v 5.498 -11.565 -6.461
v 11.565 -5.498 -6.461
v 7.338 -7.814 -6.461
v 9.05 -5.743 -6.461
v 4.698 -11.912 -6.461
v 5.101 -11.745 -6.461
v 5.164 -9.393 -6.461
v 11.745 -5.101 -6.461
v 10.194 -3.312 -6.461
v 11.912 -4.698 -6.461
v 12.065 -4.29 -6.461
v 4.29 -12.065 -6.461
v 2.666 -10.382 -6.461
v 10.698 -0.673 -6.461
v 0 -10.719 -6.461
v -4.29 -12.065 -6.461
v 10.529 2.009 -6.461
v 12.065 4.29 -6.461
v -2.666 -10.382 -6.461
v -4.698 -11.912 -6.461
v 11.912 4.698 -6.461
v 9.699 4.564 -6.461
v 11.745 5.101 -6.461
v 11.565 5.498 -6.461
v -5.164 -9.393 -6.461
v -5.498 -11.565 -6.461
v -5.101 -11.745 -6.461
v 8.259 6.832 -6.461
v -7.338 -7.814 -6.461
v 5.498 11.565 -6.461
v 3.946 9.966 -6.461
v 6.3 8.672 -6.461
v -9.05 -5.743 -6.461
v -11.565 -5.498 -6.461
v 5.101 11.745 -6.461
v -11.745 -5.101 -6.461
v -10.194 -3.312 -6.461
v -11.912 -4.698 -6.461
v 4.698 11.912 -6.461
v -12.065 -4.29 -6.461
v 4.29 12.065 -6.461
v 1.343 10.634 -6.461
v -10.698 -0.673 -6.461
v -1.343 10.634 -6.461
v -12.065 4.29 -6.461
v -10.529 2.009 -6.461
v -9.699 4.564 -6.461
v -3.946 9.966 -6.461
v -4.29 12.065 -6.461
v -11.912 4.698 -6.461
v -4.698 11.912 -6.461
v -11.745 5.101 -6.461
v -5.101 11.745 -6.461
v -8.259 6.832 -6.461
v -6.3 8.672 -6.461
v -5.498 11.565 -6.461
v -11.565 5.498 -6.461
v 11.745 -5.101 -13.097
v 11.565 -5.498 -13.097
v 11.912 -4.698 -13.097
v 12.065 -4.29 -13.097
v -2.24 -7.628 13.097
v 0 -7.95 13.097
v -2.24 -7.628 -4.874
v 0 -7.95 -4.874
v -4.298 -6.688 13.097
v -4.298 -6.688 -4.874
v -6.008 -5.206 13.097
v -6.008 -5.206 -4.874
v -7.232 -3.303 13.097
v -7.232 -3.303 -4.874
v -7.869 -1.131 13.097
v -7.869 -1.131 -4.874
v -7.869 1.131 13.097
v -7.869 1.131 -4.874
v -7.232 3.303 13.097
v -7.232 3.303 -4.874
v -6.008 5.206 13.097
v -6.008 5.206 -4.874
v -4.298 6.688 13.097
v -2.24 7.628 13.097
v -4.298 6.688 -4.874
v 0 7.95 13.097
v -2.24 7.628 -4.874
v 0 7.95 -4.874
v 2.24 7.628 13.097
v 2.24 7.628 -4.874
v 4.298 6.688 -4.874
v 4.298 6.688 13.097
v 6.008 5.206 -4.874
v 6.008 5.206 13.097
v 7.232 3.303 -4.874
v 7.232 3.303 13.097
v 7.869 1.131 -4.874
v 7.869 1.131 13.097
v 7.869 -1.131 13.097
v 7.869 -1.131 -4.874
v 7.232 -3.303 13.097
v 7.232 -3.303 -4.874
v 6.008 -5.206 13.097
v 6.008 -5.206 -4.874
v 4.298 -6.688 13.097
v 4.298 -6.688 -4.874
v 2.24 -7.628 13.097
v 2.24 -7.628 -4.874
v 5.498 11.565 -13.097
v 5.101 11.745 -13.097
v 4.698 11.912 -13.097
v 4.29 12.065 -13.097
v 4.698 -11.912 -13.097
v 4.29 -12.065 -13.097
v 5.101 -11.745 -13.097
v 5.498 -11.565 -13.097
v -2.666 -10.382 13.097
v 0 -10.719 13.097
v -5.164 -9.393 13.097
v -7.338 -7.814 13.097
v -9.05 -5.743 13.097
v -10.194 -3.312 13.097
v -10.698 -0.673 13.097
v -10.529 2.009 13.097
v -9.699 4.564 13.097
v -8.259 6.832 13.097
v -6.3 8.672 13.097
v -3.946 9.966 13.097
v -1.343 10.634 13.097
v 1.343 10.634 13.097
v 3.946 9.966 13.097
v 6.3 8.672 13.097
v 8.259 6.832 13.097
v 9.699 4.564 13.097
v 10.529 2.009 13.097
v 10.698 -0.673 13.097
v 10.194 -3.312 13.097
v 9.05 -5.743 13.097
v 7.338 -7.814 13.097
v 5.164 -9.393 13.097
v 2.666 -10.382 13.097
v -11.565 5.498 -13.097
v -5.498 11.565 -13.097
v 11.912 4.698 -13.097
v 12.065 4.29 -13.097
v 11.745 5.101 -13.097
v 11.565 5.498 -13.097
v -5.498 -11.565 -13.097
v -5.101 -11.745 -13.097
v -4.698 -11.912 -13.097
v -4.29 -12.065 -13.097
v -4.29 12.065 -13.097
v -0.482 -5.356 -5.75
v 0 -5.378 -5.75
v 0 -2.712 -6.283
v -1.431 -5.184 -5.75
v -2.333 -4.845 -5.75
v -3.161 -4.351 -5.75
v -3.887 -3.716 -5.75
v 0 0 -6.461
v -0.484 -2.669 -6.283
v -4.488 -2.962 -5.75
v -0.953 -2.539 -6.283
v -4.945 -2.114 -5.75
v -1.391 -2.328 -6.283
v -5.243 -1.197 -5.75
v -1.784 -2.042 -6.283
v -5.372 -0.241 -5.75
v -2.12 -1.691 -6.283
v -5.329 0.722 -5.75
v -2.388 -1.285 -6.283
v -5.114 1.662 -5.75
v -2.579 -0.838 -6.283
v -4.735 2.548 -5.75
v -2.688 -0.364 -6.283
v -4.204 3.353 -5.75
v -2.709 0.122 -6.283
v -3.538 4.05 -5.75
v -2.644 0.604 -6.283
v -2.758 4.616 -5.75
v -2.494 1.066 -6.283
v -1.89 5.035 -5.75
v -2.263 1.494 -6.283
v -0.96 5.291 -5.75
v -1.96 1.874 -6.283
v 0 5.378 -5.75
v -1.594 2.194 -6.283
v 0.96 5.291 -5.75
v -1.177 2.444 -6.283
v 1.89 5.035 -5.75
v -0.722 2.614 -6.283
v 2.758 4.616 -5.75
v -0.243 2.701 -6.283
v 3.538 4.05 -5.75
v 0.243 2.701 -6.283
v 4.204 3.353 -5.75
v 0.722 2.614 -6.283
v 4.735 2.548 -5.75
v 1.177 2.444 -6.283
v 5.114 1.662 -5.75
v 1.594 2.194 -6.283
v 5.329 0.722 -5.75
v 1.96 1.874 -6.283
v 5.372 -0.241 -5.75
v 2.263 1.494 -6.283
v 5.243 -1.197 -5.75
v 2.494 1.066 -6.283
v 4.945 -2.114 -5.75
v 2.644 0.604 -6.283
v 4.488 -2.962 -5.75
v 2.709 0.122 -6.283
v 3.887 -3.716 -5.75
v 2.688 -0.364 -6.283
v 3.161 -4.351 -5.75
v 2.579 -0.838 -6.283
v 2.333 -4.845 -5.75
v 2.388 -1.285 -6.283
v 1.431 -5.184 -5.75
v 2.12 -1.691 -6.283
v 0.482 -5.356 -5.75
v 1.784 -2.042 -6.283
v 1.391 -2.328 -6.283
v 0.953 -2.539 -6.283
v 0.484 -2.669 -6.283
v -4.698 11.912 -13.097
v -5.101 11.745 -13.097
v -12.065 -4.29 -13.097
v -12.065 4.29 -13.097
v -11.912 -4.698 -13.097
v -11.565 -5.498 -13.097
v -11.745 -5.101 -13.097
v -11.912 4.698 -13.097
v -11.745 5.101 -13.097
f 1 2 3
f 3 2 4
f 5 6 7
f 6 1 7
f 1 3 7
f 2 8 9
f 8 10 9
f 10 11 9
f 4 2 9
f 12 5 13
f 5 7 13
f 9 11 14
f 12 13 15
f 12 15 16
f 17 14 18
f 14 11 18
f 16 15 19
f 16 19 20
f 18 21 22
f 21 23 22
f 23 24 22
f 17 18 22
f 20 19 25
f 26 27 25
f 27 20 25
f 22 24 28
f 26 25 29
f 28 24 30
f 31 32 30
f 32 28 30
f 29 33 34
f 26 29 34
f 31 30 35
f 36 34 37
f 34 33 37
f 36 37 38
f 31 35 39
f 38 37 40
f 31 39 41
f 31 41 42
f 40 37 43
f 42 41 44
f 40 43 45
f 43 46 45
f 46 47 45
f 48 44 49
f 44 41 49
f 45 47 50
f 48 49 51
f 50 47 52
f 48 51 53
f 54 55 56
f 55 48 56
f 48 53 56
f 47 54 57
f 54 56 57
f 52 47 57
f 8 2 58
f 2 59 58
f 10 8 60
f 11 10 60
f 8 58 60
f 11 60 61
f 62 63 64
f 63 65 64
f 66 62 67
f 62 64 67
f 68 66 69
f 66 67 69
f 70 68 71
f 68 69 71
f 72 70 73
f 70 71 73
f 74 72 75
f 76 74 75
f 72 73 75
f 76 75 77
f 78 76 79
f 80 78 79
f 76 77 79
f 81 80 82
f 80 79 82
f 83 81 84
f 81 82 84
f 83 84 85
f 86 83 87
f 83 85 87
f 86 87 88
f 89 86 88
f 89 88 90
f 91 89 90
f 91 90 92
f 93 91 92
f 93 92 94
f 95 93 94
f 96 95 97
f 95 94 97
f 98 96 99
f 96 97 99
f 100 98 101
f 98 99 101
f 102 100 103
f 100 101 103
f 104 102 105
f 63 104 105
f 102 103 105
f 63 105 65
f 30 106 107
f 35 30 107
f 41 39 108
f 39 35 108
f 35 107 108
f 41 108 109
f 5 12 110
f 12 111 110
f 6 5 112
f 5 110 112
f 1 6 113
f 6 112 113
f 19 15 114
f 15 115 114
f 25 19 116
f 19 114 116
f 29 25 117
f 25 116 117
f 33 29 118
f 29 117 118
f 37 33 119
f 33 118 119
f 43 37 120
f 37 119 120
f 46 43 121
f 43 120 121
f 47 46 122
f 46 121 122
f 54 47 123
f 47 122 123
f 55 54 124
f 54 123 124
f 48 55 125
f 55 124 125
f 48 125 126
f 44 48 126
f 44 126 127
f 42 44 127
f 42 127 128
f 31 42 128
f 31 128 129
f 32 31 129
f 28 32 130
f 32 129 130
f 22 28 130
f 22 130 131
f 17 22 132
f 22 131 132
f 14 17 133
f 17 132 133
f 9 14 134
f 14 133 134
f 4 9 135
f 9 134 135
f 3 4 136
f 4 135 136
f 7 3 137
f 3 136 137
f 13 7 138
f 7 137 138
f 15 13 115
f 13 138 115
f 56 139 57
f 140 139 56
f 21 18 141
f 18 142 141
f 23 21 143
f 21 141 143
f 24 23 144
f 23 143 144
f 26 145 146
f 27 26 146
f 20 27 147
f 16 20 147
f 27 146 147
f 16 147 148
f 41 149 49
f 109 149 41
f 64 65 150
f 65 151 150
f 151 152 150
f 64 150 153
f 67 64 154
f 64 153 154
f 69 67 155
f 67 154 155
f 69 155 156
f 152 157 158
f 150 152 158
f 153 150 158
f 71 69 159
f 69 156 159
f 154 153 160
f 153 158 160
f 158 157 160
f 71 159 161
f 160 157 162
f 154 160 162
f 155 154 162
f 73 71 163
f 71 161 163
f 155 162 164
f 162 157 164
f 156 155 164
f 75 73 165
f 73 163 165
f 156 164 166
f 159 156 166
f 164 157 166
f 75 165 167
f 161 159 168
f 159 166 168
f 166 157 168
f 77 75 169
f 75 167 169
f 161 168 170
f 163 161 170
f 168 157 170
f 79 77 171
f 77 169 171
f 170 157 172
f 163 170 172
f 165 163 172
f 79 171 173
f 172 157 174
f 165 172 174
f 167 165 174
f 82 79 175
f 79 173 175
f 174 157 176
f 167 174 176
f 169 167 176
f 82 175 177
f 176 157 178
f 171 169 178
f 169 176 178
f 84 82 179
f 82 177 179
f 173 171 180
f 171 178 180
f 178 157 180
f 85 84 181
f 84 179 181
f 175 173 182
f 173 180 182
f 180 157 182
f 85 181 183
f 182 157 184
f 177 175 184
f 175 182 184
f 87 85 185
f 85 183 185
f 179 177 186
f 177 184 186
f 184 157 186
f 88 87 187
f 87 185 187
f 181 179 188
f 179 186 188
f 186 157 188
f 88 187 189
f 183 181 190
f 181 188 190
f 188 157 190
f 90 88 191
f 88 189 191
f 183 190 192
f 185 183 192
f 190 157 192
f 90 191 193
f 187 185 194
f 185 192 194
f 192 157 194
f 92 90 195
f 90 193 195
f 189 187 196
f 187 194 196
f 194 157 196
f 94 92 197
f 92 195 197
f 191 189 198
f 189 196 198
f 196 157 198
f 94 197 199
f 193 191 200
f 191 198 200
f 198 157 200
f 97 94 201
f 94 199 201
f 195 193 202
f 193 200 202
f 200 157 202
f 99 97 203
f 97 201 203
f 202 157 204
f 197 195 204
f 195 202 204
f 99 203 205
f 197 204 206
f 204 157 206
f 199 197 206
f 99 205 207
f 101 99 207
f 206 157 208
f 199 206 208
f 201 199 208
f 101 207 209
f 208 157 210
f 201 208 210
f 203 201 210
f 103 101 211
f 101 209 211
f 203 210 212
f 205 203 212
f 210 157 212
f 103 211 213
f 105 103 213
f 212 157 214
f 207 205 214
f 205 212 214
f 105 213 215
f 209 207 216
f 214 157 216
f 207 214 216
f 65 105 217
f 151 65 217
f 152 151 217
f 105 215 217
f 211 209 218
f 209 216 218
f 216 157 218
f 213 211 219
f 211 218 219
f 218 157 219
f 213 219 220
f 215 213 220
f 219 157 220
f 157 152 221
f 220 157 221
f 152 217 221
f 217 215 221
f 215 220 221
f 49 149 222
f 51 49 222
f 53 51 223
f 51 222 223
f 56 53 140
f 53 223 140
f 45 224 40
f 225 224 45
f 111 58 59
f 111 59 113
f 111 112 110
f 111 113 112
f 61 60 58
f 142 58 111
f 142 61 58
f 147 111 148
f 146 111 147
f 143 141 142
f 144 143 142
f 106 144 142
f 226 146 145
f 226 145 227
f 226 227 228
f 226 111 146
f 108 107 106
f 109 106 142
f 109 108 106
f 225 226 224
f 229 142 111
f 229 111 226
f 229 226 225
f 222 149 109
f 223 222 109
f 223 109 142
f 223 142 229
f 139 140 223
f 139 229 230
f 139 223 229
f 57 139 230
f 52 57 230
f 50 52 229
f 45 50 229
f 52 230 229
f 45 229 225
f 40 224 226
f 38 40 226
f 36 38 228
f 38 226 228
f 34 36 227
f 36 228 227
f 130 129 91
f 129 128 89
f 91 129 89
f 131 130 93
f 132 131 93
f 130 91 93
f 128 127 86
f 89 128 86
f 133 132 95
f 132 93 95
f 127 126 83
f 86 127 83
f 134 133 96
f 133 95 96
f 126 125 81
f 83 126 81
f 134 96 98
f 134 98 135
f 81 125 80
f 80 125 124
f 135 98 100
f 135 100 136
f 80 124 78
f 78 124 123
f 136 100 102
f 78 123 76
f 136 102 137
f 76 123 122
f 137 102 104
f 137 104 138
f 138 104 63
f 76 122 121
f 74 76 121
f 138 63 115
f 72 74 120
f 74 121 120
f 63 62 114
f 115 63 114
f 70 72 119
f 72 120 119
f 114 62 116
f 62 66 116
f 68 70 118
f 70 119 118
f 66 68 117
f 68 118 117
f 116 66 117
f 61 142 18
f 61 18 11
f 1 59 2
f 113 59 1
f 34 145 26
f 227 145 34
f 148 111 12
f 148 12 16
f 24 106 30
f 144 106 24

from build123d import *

# Parameters (mm, degrees)
SKETCH4_R           = 10.7188
BOSS_EXTRUDE1_DEPTH = 6.63575
SKETCH5_W           = 6.63575
SKETCH5_H           = 0.254


with BuildPart() as part:
    # Sketch3 → Revolve1 (revolve)
    with BuildSketch(Plane(origin=(0, 0, 0), x_dir=(0, 0, -1), z_dir=(1, 0, 0))):
        with BuildLine():
            Line((6.461125, 0), (13.096875, 0))
            Line((13.096875, 0), (13.096875, -10.7188))
            Line((13.096875, -10.7188), (-13.096875, -10.7188))
            Line((-13.096875, -10.7188), (-13.096875, -7.9502))
            Line((-13.096875, -7.9502), (4.873625, -7.9502))
            ThreePointArc((4.873625, -7.9502), (6.060370876, -4.053573618), (6.461125, 0))
        make_face()
    revolve(axis=Axis((0, 0, 13.096875), (0, 0, -1)))

    # Sketch4 → Boss-Extrude1 (add)
    with BuildSketch(Plane(origin=(0, 0, -13.096875), x_dir=(-1, 0, 0), z_dir=(0, 0, -1))):
        Polygon((4.99748663, 12.065), (-4.99748663, 12.065), (-12.065, 4.99748663), (-12.065, -4.99748663), (-4.99748663, -12.065), (4.99748663, -12.065), (12.065, -4.99748663), (12.065, 4.99748663), align=None)
        Circle(SKETCH4_R, mode=Mode.SUBTRACT)
    extrude(amount=-BOSS_EXTRUDE1_DEPTH)

    # Sketch5 → Cut-Revolve1 (revolve, cut)
    with BuildSketch(Plane(origin=(0, 0, 0), x_dir=(0, 0, -1), z_dir=(0.923879533, -0.382683432, 0))):
        with Locations((9.779, 12.932061897)):
            Rectangle(SKETCH5_W, SKETCH5_H)
    revolve(axis=Axis((0, 0, 13.096875), (0, 0, 1)), mode=Mode.SUBTRACT)


solid = part.part
